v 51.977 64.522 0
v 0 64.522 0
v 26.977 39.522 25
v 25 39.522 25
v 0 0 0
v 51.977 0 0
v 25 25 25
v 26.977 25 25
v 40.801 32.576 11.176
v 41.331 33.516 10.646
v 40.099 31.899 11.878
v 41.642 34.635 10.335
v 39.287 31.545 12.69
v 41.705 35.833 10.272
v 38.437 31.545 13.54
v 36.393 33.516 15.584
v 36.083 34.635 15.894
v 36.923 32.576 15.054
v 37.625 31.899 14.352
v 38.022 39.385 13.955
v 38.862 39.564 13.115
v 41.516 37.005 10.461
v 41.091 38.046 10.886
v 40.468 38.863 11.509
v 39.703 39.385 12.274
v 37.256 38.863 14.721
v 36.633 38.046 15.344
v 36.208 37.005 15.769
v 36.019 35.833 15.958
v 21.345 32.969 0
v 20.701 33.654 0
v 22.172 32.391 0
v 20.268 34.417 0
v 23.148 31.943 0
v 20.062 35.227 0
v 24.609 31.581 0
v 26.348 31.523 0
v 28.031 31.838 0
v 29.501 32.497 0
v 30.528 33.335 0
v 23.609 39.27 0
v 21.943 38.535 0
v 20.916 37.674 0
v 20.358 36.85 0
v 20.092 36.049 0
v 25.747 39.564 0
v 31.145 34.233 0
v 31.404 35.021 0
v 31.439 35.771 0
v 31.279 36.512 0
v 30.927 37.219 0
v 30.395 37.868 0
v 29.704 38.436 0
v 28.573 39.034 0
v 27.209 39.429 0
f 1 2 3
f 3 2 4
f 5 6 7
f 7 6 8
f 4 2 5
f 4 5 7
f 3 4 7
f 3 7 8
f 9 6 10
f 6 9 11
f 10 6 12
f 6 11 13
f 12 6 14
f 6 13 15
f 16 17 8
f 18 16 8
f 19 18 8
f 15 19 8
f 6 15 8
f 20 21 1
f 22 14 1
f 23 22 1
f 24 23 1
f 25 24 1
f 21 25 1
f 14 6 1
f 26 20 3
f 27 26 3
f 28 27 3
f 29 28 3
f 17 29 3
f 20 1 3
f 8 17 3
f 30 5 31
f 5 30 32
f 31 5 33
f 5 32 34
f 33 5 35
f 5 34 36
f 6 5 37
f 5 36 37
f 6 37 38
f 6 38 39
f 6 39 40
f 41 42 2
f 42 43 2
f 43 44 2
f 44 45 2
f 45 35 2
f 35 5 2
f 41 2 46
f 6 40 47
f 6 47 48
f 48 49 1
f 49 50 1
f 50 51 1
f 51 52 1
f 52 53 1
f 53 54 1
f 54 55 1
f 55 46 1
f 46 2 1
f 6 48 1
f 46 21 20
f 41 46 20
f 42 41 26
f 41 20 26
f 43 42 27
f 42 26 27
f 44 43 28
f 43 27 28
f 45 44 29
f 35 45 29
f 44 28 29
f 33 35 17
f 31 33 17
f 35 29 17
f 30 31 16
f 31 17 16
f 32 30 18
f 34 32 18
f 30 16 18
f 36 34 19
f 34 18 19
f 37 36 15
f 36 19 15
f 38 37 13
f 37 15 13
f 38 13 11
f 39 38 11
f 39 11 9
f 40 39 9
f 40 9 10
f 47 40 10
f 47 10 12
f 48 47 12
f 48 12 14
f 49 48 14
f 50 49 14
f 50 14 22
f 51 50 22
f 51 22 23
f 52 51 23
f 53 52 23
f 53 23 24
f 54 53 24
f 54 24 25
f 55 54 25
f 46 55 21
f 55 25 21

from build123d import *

# Parameters (mm, degrees)
F0_W     = 51.9770644605
F0_H     = 64.5220279694
F1_DEPTH = 25
F1_TAPER = 45
F2_R     = 4.0319564515
F3_DEPTH = 25


with BuildPart() as f1:
    # F0 (on Top) → F1 (new body)
    with BuildSketch(Plane.XY):
        with Locations((25.9885322303, 32.2610139847)):
            Rectangle(F0_W, F0_H)
    extrude(amount=F1_DEPTH, taper=F1_TAPER)

    # F2 (on face) → F3 (cut)
    with BuildSketch(Plane(origin=(25.9885322303, 0, 25.9885322303), x_dir=(0, 1, 0), z_dir=(0.7071067812, 0, 0.7071067812))):
        with Locations((35.5320125818, -18.2061810046)):
            Circle(F2_R)
    extrude(amount=-F3_DEPTH, mode=Mode.SUBTRACT)


solid = f1.part
